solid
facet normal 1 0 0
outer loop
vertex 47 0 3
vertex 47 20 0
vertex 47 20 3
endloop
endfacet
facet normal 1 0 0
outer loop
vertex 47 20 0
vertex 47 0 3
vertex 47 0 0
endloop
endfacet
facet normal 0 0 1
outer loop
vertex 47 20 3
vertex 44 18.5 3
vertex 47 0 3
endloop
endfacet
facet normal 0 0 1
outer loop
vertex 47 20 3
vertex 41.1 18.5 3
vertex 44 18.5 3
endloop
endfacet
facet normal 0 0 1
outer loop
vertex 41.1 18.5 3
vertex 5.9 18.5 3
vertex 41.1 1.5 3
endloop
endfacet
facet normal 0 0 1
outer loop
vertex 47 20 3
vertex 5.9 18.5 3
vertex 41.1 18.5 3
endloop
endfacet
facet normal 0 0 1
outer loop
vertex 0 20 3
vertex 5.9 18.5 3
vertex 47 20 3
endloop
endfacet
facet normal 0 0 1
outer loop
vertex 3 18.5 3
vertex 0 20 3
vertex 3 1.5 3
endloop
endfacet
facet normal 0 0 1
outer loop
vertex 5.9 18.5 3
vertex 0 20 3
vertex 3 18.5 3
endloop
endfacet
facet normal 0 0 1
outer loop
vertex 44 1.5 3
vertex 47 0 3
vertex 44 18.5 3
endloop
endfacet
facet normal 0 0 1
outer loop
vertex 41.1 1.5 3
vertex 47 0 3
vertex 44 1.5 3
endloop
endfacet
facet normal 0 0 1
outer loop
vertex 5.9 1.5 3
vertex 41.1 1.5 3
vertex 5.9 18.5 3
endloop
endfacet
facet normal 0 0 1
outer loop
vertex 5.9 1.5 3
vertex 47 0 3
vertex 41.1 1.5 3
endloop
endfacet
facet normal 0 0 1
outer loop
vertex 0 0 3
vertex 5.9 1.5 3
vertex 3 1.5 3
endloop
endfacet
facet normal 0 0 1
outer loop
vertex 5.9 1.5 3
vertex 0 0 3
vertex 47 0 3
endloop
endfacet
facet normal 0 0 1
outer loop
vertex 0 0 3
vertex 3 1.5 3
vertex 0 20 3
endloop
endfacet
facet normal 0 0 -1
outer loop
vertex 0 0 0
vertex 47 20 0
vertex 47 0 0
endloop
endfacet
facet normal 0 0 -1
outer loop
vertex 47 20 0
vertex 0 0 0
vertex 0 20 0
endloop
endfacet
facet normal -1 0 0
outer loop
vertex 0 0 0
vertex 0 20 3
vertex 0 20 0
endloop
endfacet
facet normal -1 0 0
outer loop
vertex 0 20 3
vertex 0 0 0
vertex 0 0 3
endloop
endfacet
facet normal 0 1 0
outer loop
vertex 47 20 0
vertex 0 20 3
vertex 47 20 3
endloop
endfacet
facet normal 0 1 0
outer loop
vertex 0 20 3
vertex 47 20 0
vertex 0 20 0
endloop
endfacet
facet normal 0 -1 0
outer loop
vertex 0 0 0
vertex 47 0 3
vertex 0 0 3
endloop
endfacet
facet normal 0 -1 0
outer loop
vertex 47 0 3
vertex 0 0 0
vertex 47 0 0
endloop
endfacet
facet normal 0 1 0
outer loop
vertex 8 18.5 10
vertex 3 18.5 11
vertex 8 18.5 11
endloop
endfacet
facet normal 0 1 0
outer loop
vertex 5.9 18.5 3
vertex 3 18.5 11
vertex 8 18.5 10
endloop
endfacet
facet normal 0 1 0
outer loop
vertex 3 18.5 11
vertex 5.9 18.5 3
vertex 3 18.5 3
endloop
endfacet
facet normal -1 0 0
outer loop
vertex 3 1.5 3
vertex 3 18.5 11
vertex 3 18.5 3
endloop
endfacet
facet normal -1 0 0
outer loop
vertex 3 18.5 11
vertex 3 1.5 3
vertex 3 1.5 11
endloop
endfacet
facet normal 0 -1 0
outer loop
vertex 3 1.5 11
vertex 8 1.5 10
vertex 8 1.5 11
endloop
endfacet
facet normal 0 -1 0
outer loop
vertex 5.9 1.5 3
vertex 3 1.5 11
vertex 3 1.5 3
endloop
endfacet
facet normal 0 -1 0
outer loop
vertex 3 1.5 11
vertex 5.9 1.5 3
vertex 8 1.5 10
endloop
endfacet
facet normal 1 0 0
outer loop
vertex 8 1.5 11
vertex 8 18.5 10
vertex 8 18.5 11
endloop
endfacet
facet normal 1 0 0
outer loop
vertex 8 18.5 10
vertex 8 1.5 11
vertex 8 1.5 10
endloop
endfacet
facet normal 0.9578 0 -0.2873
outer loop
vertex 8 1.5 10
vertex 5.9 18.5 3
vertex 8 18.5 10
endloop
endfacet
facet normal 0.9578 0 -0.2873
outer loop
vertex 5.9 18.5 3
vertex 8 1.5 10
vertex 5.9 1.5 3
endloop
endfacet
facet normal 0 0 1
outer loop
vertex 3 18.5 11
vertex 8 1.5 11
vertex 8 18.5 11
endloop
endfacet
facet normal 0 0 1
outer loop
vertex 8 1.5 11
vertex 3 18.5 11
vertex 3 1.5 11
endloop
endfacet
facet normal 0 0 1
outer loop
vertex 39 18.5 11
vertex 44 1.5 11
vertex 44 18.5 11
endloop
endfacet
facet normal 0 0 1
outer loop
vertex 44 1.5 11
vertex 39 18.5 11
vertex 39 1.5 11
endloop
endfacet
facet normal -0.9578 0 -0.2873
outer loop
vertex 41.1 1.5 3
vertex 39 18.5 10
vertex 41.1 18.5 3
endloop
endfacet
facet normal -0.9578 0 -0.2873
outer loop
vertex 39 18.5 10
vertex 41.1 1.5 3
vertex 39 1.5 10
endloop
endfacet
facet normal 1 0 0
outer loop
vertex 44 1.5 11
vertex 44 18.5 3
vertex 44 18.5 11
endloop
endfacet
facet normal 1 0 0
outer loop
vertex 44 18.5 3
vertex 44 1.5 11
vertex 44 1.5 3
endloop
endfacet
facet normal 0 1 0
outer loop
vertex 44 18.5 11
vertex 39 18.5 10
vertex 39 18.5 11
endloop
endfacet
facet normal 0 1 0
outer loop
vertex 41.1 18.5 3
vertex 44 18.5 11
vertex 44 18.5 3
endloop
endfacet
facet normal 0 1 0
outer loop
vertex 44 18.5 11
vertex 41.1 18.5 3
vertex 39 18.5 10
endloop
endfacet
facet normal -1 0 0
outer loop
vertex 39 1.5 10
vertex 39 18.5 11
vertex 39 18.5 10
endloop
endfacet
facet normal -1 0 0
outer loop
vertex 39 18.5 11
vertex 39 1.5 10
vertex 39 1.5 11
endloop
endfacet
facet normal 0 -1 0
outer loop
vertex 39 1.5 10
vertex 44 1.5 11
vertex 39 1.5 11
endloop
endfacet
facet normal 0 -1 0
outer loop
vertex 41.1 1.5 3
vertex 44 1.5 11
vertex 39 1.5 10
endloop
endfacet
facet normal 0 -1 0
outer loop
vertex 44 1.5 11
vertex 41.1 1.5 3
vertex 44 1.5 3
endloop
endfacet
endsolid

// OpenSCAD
cube([47,20,3]);
translate([3,3/2,0])
hull(){
cube([2,17,0.1]);
translate([0,0,10])cube([5,17,1]);
}

translate([47-3,3/2,0])
mirror([1,0,0])
hull(){
cube([2,17,0.1]);
translate([0,0,10])cube([5,17,1]);
}
